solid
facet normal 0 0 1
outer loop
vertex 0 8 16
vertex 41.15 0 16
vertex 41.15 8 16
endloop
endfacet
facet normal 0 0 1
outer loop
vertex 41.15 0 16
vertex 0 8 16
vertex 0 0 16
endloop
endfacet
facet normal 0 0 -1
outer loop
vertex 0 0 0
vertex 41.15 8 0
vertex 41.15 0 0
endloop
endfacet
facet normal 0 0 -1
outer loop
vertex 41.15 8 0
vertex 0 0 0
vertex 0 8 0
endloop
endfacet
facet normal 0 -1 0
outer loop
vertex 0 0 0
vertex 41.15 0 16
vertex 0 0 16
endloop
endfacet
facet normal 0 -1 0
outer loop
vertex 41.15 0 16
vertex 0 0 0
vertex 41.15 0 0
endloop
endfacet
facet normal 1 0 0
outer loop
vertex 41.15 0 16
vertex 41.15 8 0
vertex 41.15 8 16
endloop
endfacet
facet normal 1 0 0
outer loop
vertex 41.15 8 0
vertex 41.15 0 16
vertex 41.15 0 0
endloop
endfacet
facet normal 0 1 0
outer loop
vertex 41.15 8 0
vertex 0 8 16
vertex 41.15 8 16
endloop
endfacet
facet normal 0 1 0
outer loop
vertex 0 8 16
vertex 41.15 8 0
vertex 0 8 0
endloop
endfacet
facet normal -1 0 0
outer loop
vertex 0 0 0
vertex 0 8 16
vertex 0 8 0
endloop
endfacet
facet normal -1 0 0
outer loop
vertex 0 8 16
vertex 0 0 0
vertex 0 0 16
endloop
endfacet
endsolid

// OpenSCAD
// file: vars.scad
$fs = 0.1;

mm = 1.0;
inch = 25.4;

rows = 5;
board_cols = 15;
hand_cols = 6;
center_cols = board_cols - 2 * hand_cols;

key_width = 0.75 * inch;
key_height = 0.75 * inch;

keyway_height = key_height * rows;
board_keyway_width = key_width * board_cols;
hand_keyway_width = key_width * hand_cols;
center_cover_width = key_width * center_cols;

plate_margin = 8 * mm;

plate_height = keyway_height + 2 * plate_margin;
board_plate_width = board_keyway_width + 2 * plate_margin;
hand_plate_width = hand_keyway_width + plate_margin; // margin only on outer edge

plate_corner_radius = 2 * mm;

mount_bottom = 0.5 * plate_margin;
mount_vcenter = 0.5 * plate_height;
mount_top = plate_height - 0.5 * plate_margin;

mount_left = 0.5 * plate_margin;
mount_hand_hcenter = 0.5 * hand_plate_width;
mount_hand_right = hand_plate_width - 0.5 * plate_margin;
mount_board_hcenter = 0.5 * board_plate_width;
mount_board_right = board_plate_width - 0.5 * plate_margin;

plate_thickness = 3 * mm;
case_depth = 10 * mm;

plate_color = [ 0, 0, 0, 0.2 ]; // rgba

center_cover_mounting_inset = 0.15 * inch;

case_overhang = 2 * mm;
hand_case_width = hand_plate_width + case_overhang + plate_margin;
middle_shell_bridge_height = 6 * mm;
case_height = plate_height + 2 * case_overhang;
top_shell_height = 8 * mm;
thread_depth = 6 * mm;
shell_chamfer = 2 * mm;
middle_shell_standoff_height = 8 * mm;
middle_shell_total_height = middle_shell_standoff_height + plate_thickness;
shell_center_lip = 2 * mm;
bottom_shell_thickness = 3 * mm;
bottom_shell_screw_recess = 2 * mm;
bottom_shell_skuf_inset = 8 * mm;
bottom_shell_joint_width = 2 * mm;
bottom_shell_joint_skew = 1 * mm;
bottom_shell_width = hand_plate_width + case_overhang + 0.5 * center_cover_width + 0.5 * bottom_shell_joint_width;

front_cover_width = center_cover_width - 2 * plate_margin;
front_cover_height = middle_shell_total_height + top_shell_height - plate_thickness;
front_cover_depth = plate_margin;

rear_cover_thickness = 1 * mm;

skuf_width = 42.0 * mm;
skuf_height = 6.0 * mm;
skuf_depth = 0.5 * mm;
// main file
include <vars.scad>

module front_cover()
{
    // Just fill the space
    cube([ front_cover_width, front_cover_depth, front_cover_height ]);
}

front_cover();
